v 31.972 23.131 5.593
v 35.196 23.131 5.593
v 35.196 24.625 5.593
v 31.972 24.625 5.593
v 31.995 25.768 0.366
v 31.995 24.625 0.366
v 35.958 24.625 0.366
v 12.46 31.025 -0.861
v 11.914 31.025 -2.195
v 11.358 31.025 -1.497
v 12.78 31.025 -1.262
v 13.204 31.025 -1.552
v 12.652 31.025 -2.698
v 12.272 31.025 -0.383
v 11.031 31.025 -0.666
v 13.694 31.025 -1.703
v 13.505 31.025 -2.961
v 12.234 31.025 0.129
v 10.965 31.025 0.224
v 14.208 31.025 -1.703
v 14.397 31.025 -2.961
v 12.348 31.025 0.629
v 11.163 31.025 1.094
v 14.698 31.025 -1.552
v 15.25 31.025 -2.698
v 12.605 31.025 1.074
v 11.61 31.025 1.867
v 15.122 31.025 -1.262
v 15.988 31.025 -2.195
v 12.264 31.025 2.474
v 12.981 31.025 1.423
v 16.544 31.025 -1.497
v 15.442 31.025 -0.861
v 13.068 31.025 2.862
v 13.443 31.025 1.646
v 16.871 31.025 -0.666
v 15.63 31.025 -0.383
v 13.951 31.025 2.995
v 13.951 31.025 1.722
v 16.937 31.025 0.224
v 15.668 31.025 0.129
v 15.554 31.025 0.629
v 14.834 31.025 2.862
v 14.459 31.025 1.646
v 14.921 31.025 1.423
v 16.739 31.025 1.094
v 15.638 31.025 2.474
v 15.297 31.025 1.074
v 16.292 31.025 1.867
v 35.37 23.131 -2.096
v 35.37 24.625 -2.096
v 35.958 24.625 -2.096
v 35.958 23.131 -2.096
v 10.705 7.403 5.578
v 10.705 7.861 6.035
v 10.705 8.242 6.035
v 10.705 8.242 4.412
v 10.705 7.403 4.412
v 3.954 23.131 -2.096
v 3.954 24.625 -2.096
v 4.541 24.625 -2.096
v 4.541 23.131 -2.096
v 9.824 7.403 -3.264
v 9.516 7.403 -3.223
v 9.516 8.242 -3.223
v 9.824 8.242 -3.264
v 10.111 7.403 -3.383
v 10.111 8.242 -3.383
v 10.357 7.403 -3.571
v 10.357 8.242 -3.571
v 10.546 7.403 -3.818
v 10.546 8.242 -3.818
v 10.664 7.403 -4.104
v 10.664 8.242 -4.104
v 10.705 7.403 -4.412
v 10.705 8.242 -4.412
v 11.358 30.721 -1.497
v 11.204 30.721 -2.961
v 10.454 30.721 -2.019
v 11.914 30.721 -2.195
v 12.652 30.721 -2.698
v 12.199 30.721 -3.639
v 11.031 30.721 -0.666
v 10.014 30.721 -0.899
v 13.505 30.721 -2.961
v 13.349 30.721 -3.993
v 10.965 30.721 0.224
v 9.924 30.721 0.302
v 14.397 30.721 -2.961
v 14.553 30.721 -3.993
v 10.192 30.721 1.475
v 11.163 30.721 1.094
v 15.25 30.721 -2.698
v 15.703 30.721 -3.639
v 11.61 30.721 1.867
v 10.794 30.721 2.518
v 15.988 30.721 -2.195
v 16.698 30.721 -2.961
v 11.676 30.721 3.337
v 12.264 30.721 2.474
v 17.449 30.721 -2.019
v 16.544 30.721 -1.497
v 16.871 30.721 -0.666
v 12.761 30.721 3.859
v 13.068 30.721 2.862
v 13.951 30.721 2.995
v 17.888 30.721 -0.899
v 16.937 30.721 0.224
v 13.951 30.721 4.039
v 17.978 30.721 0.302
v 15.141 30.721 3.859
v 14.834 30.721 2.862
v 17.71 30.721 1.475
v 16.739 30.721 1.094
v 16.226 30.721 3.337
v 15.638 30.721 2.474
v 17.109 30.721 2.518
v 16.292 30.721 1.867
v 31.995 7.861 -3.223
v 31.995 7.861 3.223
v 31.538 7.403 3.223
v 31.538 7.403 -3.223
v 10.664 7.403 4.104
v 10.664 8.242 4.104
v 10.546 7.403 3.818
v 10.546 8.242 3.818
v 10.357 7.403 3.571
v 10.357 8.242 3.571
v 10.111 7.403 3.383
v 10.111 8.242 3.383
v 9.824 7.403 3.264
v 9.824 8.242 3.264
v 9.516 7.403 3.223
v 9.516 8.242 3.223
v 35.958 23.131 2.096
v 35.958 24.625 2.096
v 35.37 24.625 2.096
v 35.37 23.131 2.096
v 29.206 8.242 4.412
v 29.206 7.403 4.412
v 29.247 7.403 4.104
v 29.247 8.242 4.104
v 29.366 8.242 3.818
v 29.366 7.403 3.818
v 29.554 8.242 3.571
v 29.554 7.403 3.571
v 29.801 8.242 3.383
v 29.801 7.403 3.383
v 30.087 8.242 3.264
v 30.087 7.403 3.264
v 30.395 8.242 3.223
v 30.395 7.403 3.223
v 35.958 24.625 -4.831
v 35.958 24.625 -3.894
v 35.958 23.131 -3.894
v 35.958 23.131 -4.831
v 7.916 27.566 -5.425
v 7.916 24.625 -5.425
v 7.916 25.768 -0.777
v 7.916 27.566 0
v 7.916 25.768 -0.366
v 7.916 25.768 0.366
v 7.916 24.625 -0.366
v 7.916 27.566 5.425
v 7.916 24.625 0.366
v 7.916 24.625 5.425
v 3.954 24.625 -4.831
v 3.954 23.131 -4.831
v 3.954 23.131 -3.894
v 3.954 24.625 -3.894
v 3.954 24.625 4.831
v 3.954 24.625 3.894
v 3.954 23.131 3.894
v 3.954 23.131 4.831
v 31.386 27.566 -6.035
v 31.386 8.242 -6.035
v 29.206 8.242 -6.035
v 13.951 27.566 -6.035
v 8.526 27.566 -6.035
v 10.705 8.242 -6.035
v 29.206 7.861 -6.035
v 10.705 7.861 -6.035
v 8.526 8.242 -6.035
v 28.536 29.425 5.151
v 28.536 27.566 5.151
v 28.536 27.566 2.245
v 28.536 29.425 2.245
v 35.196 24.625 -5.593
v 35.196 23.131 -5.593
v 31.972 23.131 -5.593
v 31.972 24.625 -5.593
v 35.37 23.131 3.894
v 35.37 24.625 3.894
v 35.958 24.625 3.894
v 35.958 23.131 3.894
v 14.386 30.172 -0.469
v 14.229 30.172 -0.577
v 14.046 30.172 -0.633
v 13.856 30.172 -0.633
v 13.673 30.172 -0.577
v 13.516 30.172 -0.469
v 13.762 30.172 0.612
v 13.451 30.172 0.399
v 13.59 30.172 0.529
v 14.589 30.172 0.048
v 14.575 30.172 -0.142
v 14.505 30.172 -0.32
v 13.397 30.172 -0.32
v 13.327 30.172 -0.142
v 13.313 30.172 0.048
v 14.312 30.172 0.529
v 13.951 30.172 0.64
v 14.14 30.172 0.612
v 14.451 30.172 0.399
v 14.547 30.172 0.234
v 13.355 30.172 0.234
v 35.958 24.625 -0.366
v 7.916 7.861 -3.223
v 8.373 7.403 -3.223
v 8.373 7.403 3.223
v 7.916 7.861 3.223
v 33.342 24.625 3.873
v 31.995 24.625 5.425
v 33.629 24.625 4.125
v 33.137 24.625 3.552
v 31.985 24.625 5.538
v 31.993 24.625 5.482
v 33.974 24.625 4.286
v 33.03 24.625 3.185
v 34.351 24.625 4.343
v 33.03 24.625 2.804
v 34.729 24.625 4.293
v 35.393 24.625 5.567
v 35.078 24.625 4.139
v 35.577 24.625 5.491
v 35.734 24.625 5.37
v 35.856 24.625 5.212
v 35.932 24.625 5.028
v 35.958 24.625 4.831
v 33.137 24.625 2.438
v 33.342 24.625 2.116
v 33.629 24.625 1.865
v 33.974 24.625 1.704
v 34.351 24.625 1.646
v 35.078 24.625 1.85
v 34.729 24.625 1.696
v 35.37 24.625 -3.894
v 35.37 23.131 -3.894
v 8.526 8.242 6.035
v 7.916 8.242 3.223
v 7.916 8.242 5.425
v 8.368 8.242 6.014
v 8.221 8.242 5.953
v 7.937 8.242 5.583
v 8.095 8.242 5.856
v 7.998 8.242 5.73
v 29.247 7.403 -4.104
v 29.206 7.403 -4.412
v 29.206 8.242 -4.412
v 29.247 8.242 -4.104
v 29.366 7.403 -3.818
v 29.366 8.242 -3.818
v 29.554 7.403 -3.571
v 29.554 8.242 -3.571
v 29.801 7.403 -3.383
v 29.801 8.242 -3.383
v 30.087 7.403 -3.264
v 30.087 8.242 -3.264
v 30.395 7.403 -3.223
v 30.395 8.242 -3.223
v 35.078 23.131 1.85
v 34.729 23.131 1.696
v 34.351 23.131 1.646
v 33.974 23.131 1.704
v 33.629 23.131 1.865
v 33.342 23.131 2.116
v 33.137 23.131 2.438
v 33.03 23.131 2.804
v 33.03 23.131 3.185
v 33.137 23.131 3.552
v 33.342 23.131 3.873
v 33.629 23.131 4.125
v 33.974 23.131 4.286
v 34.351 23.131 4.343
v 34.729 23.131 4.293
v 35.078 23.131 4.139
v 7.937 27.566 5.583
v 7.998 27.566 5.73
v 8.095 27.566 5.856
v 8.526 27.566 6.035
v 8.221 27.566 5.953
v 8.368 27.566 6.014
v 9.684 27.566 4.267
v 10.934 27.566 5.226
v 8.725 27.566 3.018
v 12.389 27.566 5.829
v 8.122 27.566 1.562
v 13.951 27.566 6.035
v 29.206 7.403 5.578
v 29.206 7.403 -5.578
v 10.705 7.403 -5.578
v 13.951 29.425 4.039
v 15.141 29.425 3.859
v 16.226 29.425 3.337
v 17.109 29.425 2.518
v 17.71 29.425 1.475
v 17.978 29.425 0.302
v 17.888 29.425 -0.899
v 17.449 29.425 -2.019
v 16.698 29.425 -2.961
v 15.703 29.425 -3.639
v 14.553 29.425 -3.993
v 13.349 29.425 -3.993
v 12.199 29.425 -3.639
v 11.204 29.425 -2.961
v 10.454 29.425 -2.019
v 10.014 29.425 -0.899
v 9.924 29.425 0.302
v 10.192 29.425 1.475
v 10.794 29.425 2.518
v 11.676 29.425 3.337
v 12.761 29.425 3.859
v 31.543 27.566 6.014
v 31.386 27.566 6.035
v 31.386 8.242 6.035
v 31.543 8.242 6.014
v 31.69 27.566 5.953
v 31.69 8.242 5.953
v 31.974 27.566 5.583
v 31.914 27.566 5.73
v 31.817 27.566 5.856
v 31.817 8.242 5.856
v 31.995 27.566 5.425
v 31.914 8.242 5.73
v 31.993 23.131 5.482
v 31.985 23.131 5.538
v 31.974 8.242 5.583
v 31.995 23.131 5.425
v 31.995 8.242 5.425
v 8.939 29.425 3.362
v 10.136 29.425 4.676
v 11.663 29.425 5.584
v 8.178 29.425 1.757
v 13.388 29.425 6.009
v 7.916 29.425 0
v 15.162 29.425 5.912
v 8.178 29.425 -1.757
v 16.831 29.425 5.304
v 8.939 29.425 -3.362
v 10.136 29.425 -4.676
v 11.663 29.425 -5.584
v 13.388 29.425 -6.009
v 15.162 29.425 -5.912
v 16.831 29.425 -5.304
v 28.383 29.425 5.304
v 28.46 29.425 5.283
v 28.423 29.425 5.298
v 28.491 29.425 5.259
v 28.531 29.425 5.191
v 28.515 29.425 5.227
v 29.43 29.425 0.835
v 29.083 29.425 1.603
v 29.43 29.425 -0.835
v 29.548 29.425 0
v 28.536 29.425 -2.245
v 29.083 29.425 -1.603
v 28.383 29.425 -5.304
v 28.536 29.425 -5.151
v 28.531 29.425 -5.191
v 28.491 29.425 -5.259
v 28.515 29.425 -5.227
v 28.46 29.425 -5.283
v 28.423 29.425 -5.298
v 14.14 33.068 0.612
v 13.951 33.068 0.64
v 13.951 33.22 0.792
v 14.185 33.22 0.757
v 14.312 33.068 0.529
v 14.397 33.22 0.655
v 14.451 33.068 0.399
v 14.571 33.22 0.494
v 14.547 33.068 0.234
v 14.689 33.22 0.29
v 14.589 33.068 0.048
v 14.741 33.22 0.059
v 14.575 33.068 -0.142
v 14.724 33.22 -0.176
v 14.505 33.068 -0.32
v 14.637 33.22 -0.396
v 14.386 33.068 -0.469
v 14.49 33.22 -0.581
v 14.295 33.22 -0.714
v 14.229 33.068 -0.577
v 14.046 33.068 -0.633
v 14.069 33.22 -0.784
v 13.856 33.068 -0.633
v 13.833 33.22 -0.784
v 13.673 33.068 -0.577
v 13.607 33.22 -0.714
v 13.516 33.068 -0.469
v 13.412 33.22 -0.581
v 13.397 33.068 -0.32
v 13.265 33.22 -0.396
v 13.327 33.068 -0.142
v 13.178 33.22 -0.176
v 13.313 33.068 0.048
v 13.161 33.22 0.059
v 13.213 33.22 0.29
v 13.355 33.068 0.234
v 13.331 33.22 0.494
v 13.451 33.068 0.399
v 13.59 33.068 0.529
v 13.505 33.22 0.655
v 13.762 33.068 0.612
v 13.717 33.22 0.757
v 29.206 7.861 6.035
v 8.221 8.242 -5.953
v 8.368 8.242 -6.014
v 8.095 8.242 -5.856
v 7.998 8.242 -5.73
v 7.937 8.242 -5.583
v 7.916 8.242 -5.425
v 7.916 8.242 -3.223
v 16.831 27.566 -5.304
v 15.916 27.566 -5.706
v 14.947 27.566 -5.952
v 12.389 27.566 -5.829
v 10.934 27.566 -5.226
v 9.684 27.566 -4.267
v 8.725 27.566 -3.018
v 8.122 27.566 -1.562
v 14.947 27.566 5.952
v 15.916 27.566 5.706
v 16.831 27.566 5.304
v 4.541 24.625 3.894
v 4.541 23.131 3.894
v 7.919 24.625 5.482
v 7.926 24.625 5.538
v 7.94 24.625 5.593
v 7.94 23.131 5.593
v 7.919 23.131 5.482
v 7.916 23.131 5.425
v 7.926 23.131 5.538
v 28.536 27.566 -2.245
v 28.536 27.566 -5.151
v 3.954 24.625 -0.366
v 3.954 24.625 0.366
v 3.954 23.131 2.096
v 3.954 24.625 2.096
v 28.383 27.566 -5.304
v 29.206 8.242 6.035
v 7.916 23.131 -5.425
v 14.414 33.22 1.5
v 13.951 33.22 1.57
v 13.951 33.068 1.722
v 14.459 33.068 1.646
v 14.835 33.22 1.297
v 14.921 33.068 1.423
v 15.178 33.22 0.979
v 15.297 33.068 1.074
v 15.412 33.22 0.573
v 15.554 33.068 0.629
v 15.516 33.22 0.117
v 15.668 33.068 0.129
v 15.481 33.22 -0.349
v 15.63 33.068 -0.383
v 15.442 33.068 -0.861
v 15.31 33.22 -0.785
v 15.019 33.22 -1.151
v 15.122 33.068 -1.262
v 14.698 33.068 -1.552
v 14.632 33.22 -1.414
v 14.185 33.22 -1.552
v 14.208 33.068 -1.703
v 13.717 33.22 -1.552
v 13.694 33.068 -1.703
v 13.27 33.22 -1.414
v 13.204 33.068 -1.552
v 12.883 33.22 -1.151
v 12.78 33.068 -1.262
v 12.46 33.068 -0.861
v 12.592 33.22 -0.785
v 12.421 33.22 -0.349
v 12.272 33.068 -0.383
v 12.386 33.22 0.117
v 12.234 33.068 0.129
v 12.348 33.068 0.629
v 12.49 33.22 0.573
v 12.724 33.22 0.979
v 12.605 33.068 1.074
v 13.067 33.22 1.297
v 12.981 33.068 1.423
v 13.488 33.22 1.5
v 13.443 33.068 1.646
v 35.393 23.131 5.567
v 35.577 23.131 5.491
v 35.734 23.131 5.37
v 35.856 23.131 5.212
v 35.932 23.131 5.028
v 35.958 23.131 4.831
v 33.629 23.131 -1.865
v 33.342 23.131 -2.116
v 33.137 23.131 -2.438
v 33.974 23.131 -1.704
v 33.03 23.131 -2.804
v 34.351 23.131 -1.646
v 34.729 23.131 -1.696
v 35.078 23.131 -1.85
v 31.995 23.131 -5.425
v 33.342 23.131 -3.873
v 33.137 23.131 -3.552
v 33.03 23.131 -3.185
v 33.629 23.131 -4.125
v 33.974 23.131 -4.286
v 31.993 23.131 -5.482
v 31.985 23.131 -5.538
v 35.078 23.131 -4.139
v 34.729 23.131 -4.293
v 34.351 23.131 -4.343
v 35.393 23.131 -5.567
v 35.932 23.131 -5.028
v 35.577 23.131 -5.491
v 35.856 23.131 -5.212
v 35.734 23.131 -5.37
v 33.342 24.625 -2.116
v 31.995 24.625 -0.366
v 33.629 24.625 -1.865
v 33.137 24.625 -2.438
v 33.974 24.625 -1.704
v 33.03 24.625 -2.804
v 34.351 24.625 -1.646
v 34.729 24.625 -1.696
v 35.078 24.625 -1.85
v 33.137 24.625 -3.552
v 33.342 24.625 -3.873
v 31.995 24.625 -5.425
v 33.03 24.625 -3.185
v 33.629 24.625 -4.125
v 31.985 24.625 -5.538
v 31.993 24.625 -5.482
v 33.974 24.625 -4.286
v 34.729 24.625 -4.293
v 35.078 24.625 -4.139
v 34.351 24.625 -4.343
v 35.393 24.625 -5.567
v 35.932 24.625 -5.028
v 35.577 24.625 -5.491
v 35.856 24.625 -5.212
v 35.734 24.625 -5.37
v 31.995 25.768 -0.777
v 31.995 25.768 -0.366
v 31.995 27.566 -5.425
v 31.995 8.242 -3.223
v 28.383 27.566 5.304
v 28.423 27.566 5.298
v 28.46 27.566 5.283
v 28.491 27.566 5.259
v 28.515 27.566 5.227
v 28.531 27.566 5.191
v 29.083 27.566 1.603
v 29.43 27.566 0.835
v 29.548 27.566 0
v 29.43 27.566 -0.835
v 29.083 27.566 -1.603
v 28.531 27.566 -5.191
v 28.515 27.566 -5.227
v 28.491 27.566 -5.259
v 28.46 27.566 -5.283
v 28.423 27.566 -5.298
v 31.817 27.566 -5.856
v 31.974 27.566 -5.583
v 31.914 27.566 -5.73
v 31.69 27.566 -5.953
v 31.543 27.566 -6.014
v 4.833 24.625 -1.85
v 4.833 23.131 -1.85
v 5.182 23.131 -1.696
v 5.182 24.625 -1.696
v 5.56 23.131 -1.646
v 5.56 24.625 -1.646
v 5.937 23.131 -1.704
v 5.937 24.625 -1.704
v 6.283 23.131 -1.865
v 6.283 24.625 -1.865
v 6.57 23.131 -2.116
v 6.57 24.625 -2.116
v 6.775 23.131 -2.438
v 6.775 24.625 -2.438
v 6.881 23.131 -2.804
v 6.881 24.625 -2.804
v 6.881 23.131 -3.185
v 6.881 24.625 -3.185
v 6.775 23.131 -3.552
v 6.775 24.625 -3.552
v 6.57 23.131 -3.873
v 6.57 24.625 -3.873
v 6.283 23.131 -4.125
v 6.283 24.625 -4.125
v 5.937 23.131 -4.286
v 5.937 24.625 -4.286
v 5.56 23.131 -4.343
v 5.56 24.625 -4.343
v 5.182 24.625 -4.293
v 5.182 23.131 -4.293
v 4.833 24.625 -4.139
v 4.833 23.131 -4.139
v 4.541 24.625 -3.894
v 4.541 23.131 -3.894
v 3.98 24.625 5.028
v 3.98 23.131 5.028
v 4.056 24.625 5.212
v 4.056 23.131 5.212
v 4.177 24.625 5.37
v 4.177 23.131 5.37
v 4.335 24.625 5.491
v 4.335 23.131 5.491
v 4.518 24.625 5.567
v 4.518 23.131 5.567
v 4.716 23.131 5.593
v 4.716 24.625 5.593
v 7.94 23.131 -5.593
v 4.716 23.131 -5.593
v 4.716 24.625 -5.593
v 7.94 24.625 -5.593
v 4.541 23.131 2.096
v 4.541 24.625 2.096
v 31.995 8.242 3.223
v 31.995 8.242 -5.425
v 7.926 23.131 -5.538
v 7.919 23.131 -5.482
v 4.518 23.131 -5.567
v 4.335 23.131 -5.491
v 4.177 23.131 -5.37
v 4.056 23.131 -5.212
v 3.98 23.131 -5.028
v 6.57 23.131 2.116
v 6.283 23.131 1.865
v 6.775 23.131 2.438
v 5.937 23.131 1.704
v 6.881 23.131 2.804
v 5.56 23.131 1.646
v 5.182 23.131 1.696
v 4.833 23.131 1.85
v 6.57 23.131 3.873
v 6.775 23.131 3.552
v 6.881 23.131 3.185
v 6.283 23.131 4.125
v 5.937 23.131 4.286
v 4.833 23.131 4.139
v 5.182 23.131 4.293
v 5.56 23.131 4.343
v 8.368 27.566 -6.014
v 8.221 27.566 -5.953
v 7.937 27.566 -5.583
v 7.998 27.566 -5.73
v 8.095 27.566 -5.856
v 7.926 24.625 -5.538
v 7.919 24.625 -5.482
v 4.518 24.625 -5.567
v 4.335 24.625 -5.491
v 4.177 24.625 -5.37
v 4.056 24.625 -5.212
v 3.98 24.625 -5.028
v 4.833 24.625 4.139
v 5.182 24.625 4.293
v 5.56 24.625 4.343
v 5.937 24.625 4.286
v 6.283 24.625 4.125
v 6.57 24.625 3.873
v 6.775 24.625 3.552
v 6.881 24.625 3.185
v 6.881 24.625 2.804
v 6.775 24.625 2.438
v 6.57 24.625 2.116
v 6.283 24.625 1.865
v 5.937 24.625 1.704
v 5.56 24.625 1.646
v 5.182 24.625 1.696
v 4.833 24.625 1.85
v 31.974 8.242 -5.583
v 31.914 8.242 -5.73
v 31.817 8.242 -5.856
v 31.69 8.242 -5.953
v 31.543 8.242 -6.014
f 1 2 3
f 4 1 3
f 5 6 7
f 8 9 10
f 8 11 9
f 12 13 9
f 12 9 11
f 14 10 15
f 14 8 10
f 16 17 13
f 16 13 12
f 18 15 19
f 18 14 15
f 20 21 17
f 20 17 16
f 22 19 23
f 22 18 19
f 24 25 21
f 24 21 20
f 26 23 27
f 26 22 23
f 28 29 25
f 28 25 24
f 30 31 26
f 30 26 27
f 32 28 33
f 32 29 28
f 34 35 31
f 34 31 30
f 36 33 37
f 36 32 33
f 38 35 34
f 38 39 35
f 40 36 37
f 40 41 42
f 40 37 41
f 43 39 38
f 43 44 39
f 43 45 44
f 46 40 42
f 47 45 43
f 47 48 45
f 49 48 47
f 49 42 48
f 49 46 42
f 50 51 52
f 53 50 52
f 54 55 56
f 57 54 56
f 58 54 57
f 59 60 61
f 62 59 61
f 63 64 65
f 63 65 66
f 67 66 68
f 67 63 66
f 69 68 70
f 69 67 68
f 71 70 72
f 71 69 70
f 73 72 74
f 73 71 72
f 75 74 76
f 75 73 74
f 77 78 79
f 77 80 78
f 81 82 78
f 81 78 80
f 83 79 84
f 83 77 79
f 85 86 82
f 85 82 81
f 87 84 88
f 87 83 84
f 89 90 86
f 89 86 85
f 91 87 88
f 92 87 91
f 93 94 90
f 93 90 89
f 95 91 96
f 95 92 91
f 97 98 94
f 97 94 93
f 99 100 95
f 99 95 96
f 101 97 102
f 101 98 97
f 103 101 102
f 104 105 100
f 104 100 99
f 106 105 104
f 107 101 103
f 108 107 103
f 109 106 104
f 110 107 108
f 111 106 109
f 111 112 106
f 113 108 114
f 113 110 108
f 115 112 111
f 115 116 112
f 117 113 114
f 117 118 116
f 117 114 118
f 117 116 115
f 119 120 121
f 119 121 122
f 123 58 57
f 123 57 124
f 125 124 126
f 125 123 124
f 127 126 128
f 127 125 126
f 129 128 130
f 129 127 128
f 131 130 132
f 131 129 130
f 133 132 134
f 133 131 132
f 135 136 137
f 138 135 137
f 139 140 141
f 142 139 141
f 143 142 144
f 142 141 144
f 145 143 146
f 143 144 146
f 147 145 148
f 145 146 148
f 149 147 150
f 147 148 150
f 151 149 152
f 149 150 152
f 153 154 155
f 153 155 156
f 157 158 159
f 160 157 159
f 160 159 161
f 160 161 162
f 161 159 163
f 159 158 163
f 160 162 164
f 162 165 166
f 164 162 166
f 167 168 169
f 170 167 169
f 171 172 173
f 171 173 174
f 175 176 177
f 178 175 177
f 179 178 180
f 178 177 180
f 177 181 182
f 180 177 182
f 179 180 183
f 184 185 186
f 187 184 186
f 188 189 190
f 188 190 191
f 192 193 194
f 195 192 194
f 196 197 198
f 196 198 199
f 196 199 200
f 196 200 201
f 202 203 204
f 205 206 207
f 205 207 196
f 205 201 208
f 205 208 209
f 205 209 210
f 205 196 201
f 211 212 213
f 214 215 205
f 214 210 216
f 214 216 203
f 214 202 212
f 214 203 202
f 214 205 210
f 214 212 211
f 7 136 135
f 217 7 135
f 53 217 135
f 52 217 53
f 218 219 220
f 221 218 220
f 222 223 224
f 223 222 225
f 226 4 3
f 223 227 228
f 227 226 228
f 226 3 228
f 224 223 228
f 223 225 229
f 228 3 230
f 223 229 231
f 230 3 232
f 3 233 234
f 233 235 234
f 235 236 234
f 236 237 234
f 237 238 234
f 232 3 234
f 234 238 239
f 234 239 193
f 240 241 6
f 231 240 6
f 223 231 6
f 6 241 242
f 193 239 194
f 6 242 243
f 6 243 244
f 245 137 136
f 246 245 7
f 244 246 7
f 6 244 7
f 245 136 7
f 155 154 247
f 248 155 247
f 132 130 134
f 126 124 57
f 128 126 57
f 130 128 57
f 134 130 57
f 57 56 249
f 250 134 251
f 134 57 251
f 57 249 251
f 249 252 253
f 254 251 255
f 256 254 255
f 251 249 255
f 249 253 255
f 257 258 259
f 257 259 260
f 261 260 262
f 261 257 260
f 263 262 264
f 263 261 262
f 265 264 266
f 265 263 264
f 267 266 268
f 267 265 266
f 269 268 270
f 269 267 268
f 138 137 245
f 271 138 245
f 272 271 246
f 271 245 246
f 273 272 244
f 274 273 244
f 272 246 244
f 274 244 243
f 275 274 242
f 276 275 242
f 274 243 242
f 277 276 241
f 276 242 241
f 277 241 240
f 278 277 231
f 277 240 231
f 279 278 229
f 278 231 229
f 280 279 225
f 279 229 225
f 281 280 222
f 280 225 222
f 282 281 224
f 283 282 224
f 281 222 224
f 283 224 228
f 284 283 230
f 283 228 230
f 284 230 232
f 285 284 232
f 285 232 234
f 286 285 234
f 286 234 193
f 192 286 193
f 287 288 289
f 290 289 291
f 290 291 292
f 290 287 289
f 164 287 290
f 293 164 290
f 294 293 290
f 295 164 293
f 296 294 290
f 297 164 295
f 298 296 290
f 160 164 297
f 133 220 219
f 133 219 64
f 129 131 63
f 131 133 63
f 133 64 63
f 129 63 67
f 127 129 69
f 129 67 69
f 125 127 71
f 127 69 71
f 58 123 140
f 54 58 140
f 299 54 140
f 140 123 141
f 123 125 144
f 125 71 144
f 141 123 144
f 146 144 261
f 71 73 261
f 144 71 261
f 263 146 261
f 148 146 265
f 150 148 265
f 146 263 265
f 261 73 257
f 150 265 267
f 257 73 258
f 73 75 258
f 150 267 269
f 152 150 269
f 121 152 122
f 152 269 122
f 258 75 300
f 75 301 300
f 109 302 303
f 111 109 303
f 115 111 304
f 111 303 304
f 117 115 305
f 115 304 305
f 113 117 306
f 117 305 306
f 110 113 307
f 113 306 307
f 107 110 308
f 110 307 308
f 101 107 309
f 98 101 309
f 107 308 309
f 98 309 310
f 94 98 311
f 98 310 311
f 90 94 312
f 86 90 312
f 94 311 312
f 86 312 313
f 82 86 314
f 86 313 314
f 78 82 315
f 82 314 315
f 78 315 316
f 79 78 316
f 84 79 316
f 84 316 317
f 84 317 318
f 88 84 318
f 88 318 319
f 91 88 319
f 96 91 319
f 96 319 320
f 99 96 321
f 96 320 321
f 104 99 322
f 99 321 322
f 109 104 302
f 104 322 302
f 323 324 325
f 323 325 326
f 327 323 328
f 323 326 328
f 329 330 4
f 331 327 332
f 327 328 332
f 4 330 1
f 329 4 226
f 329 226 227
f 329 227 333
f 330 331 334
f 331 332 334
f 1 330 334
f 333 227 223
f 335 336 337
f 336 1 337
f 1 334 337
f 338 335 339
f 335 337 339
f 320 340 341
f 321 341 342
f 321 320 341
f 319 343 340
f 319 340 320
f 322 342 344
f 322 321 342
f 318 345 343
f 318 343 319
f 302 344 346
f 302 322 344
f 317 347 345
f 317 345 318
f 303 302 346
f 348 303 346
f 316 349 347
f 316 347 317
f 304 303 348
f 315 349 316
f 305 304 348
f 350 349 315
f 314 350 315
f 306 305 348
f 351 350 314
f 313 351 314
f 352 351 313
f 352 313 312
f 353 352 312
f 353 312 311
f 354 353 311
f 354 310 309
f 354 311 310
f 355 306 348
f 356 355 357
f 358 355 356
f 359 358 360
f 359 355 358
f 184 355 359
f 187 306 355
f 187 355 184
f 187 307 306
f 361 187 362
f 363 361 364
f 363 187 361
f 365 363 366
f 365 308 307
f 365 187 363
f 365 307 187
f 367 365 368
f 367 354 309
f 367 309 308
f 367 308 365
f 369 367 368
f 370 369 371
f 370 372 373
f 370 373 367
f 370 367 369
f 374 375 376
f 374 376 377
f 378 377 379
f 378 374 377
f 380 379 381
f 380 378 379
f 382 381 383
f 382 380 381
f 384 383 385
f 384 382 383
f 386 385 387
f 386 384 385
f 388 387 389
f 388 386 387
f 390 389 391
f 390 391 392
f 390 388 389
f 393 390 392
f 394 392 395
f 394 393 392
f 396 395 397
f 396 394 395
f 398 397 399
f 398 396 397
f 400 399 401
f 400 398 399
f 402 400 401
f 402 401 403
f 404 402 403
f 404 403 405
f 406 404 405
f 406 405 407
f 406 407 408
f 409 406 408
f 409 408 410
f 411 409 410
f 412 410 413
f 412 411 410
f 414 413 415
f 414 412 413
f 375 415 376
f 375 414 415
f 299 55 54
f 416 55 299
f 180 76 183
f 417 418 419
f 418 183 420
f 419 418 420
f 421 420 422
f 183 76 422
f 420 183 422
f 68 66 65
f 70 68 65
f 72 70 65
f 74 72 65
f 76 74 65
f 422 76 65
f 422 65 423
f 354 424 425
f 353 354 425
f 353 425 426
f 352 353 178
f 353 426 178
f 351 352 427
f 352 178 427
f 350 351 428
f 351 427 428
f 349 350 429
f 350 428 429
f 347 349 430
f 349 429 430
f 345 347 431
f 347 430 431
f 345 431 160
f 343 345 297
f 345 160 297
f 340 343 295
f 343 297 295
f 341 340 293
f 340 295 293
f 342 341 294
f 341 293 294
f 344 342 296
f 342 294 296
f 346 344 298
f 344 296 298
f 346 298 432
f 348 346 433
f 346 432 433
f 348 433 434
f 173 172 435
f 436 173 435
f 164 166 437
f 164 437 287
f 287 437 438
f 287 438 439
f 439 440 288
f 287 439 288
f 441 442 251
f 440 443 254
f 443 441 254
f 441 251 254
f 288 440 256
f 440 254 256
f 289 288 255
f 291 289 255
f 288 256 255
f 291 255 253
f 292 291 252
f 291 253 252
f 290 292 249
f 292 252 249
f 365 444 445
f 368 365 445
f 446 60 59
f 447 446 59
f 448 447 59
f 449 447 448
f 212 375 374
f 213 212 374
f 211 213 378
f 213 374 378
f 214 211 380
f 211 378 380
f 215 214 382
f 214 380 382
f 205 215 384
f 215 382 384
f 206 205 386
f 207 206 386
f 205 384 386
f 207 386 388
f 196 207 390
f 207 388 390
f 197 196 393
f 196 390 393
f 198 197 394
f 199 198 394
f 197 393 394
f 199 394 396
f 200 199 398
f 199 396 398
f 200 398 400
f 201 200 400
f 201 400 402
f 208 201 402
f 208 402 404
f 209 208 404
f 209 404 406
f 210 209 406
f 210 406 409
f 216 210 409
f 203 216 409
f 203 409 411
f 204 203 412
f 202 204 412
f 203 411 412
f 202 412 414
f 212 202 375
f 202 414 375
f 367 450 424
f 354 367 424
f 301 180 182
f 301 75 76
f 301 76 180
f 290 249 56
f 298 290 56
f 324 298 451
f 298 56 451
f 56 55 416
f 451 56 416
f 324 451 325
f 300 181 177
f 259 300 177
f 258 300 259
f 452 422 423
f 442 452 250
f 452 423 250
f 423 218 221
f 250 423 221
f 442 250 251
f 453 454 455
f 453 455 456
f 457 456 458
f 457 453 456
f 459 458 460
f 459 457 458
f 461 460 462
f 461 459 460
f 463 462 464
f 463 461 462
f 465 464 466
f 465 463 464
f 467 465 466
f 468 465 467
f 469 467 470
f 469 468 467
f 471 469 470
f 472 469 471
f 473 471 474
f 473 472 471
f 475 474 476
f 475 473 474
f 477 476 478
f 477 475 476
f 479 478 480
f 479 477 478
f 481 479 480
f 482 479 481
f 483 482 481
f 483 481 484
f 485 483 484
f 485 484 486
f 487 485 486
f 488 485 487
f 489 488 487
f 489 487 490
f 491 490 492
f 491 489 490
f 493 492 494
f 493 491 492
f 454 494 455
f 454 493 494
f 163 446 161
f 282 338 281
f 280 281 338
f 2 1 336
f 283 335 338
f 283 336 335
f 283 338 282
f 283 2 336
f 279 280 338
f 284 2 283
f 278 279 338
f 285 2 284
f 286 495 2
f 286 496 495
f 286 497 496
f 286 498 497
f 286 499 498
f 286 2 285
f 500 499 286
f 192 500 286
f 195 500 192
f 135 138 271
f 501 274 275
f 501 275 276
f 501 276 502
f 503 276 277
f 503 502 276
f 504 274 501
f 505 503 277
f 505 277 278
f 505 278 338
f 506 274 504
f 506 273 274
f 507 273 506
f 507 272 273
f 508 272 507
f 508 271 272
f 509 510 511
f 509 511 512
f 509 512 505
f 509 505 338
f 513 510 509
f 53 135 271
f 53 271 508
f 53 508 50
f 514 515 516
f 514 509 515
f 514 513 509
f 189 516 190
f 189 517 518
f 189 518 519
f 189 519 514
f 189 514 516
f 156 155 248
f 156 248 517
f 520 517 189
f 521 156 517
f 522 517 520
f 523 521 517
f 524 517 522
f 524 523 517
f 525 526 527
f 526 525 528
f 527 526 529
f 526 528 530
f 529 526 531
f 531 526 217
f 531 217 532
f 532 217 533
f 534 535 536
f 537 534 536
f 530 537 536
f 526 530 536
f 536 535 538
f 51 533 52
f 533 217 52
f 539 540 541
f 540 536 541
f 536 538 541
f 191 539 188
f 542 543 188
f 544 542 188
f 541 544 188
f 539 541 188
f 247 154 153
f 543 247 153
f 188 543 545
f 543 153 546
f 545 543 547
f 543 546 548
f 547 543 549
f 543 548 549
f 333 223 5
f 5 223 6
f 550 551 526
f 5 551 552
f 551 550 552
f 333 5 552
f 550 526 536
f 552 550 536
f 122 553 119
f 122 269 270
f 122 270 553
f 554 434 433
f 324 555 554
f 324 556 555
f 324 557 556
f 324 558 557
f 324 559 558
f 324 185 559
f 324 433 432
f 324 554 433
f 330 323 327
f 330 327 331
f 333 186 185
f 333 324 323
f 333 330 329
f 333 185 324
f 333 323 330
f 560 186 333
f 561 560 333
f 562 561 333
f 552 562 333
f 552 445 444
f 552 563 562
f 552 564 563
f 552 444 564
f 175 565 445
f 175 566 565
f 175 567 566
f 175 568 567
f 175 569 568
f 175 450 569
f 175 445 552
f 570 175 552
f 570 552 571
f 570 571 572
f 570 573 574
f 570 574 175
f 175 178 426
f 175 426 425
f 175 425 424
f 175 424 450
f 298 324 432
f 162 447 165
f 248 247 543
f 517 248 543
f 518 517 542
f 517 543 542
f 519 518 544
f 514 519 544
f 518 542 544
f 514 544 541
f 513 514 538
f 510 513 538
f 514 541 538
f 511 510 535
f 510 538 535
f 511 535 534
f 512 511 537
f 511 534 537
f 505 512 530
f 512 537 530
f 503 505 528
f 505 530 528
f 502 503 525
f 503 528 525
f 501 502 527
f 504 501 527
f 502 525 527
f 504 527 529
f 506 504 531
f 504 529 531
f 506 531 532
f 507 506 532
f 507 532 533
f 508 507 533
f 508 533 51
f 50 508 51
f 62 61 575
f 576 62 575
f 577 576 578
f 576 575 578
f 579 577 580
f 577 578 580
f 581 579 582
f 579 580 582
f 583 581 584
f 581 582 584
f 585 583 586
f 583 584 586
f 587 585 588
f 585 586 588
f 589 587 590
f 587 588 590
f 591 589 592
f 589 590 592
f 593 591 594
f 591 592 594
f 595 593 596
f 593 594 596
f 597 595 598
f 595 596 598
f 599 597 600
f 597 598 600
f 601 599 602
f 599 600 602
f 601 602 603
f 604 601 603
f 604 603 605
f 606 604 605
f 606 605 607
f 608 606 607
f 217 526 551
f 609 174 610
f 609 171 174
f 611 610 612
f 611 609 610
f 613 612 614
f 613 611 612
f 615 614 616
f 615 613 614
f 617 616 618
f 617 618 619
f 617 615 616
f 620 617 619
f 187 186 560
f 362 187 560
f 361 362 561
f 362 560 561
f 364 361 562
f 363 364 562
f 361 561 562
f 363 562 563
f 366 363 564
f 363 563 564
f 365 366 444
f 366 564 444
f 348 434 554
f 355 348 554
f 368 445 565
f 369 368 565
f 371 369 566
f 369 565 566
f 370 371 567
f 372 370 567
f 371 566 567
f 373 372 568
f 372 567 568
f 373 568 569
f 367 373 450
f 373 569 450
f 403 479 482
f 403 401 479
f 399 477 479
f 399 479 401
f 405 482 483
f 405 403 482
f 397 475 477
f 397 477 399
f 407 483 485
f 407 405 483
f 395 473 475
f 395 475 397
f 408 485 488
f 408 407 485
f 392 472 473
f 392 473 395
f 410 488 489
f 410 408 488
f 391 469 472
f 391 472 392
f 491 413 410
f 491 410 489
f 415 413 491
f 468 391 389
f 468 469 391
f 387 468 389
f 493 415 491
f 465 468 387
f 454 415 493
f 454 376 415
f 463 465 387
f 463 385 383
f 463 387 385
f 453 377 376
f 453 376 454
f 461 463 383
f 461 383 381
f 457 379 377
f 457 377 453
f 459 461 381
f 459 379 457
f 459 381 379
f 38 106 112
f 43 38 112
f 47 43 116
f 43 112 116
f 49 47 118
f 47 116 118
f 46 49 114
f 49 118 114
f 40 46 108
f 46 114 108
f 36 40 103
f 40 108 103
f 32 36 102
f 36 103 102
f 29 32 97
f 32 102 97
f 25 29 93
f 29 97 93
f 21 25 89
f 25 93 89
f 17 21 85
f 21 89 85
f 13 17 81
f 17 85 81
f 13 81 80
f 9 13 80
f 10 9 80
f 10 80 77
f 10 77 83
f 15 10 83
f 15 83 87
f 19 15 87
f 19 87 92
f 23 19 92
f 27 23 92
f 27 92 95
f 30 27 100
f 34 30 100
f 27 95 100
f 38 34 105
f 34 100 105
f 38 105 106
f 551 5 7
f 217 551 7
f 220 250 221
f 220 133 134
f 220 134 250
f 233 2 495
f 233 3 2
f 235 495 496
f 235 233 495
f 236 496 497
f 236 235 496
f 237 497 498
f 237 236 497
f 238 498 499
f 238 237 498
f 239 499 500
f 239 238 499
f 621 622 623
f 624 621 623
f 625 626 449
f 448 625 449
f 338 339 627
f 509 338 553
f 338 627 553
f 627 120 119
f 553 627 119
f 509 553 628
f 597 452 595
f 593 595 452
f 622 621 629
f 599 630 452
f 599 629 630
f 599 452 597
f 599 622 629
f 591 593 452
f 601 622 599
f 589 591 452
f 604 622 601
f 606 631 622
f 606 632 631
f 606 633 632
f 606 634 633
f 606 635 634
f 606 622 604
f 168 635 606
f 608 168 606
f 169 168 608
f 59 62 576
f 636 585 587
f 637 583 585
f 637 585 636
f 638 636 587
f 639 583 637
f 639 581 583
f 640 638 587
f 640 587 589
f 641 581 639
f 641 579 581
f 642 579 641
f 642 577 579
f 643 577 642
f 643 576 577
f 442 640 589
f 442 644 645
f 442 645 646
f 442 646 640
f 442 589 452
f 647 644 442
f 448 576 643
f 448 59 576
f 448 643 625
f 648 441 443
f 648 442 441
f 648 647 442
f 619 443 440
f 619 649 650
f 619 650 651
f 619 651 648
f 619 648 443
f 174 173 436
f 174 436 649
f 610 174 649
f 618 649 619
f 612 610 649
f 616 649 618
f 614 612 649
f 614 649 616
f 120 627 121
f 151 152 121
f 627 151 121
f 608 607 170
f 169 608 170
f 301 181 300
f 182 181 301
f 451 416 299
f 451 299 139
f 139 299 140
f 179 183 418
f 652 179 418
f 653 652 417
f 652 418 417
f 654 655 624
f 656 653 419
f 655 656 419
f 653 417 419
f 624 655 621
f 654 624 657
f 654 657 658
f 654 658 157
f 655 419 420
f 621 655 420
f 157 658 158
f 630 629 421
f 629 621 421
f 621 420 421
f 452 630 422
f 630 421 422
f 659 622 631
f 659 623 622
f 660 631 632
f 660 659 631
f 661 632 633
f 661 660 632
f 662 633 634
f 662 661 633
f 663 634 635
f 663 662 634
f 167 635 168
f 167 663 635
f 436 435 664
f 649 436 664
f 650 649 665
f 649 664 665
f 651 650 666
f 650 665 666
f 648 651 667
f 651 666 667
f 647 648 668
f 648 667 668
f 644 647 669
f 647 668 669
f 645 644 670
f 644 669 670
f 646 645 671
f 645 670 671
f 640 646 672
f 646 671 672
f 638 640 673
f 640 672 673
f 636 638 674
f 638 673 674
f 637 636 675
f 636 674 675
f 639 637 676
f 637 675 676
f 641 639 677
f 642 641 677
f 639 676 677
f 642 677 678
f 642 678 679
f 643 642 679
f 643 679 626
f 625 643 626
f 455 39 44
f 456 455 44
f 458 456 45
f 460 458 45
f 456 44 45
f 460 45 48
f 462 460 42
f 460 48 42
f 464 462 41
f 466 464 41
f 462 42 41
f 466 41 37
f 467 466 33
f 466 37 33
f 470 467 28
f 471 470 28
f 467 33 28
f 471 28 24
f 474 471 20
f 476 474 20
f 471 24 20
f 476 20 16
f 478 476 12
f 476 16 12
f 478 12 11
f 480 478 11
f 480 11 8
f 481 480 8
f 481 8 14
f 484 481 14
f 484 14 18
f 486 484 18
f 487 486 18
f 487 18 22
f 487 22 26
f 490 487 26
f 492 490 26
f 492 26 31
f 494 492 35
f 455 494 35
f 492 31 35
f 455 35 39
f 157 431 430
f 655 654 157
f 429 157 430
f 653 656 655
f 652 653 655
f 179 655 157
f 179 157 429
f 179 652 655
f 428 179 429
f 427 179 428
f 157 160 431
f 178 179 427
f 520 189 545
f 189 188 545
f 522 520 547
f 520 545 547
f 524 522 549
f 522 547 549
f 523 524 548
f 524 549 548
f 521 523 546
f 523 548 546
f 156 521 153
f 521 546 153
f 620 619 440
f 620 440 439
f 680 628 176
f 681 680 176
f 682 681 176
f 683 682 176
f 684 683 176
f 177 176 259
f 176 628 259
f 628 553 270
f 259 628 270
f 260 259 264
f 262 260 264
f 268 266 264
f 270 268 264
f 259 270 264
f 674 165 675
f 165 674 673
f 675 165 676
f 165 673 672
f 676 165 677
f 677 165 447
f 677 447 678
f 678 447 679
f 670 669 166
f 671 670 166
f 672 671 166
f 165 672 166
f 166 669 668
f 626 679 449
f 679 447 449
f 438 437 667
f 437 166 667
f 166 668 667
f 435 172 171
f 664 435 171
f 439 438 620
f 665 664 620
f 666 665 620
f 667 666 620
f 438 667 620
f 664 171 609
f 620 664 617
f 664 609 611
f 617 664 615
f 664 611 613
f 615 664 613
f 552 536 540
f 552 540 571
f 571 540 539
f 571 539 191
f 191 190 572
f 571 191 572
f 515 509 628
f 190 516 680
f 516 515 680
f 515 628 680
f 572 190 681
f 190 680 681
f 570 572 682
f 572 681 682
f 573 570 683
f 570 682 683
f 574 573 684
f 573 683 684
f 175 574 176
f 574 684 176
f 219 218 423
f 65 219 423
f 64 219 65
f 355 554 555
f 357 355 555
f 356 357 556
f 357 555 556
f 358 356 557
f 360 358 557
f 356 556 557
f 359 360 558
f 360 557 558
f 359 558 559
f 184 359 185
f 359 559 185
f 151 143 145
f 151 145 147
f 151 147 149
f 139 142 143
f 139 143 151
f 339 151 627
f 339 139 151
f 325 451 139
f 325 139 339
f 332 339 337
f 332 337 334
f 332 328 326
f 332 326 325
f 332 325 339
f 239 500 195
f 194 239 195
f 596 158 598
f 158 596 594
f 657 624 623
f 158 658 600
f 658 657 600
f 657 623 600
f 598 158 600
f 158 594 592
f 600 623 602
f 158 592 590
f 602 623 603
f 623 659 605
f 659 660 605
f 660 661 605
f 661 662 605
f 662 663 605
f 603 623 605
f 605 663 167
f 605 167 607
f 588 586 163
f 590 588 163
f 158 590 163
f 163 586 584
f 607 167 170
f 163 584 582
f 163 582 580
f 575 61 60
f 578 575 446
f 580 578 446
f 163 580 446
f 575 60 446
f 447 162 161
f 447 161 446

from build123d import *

# Parameters (mm, degrees)
BOSS_EXTRUDE1_DEPTH = 33.6042
CUT_EXTRUDE1_DEPTH  = 1.397
CHAMFER1_SIZE       = 0.762
SKETCH3_W           = 18.6436
SKETCH3_H           = 2.4892
BOSS_EXTRUDE2_DEPTH = 6.604
SKETCH4_W           = 18.6436
SKETCH4_H           = 2.4892
BOSS_EXTRUDE3_DEPTH = 6.604
FILLET1_R           = 1.27
CUT_EXTRUDE2_DEPTH  = 3.048
SKETCH6_W           = 6.604
SKETCH6_H           = 1.2192
BOSS_EXTRUDE4_DEPTH = 1.905
CUT_EXTRUDE3_DEPTH  = 1.905
BOSS_EXTRUDE5_DEPTH = 3.0988
SKETCH9_R           = 6.731
BOSS_EXTRUDE6_DEPTH = 2.159
SKETCH10_R          = 4.9911
BOSS_EXTRUDE7_DEPTH = 0.508
SKETCH11_R          = 2.8702
BOSS_EXTRUDE8_DEPTH = 3.6576
SKETCH12_R          = 1.0668
CUT_EXTRUDE4_DEPTH  = 5.08
CHAMFER2_SIZE       = 0.254
SCALE1_SCALE        = 0.6


with BuildPart() as part:
    # Sketch1 → Boss-Extrude1 (new body)
    with BuildSketch(Plane(origin=(0, 0, 0), x_dir=(1, 0, 0), z_dir=(0, 1, 0))):
        with BuildLine():
            Line((0, 9.0424), (0, -9.0424))
            ThreePointArc((0, -9.0424), (0.29757951, -9.76082049), (1.016, -10.0584))
            Line((1.016, -10.0584), (39.116, -10.0584))
            ThreePointArc((39.116, -10.0584), (39.83442049, -9.76082049), (40.132, -9.0424))
            Line((40.132, -9.0424), (40.132, 9.0424))
            ThreePointArc((40.132, 9.0424), (39.83442049, 9.76082049), (39.116, 10.0584))
            Line((39.116, 10.0584), (1.016, 10.0584))
            ThreePointArc((1.016, 10.0584), (0.29757951, 9.76082049), (0, 9.0424))
        make_face()
    extrude(amount=BOSS_EXTRUDE1_DEPTH)

    # Sketch2 → Cut-Extrude1 (cut)
    with BuildSketch(Plane.XZ):
        with BuildLine():
            Line((4.6482, 10.0584), (4.6482, 7.3533))
            ThreePointArc((4.6482, 7.3533), (4.067919955, 5.952380045), (2.667, 5.3721))
            Line((2.667, 5.3721), (0, 5.3721))
            Line((0, 5.3721), (0, 9.0424))
            ThreePointArc((0, 9.0424), (0.29757951, 9.76082049), (1.016, 10.0584))
            Line((1.016, 10.0584), (4.6482, 10.0584))
        make_face()
        with BuildLine():
            Line((35.4838, 10.0584), (35.4838, 7.3533))
            ThreePointArc((35.4838, 7.3533), (36.064080045, 5.952380045), (37.465, 5.3721))
            Line((37.465, 5.3721), (40.132, 5.3721))
            Line((40.132, 5.3721), (40.132, 9.0424))
            ThreePointArc((40.132, 9.0424), (39.83442049, 9.76082049), (39.116, 10.0584))
            Line((39.116, 10.0584), (35.4838, 10.0584))
        make_face()
        with BuildLine():
            Line((0, -5.3721), (2.667, -5.3721))
            ThreePointArc((2.667, -5.3721), (4.067919955, -5.952380045), (4.6482, -7.3533))
            Line((4.6482, -7.3533), (4.6482, -10.0584))
            Line((4.6482, -10.0584), (1.016, -10.0584))
            ThreePointArc((1.016, -10.0584), (0.29757951, -9.76082049), (0, -9.0424))
            Line((0, -9.0424), (0, -5.3721))
        make_face()
        with BuildLine():
            Line((37.465, -5.3721), (40.132, -5.3721))
            Line((40.132, -5.3721), (40.132, -9.0424))
            ThreePointArc((40.132, -9.0424), (39.83442049, -9.76082049), (39.116, -10.0584))
            Line((39.116, -10.0584), (35.4838, -10.0584))
            Line((35.4838, -10.0584), (35.4838, -7.3533))
            ThreePointArc((35.4838, -7.3533), (36.064080045, -5.952380045), (37.465, -5.3721))
        make_face()
    extrude(amount=-CUT_EXTRUDE1_DEPTH, mode=Mode.SUBTRACT)

    # Chamfer1
    chamfer1_edges = [part.edges().sort_by_distance(p)[0] for p in [
        (20.066, 0, 10.0584),
        (0, 0, 0),
        (40.132, 0, 0),
        (20.066, 0, -10.0584),
    ]]
    chamfer(chamfer1_edges, length=CHAMFER1_SIZE)

    # Sketch3 → Boss-Extrude2 (add, symmetric)
    with BuildSketch(Plane(origin=(40.132, 0, 0), x_dir=(0, 0, -1), z_dir=(1, 0, 0))):
        with Locations((0, 27.4574)):
            Rectangle(SKETCH3_W, SKETCH3_H)
    extrude(amount=BOSS_EXTRUDE2_DEPTH, both=True)

    # Sketch4 → Boss-Extrude3 (add, symmetric)
    with BuildSketch(Plane.ZY):
        with Locations((0, 27.4574)):
            Rectangle(SKETCH4_W, SKETCH4_H)
    extrude(amount=BOSS_EXTRUDE3_DEPTH, both=True)

    # Fillet1
    fillet1_edges = [part.edges().sort_by_distance(p)[0] for p in [
        (46.736, 27.4574, 9.3218),
        (46.736, 27.4574, -9.3218),
        (-6.604, 27.4574, -9.3218),
        (-6.604, 27.4574, 9.3218),
    ]]
    fillet(fillet1_edges, radius=FILLET1_R)

    # Sketch5 → Cut-Extrude2 (cut)
    with BuildSketch(Plane(origin=(0, 28.702, 0), x_dir=(1, 0, 0), z_dir=(0, 1, 0))):
        with BuildLine():
            Line((-6.604, 3.4925), (-5.625185736, 3.4925))
            ThreePointArc((-5.625185736, 3.4925), (-1.7018, 4.9911), (-5.625185736, 6.4897))
            Line((-5.625185736, 6.4897), (-6.604, 6.4897))
            Line((-6.604, 6.4897), (-6.604, 3.4925))
        make_face()
        with BuildLine():
            Line((-6.604, -6.4897), (-5.625185736, -6.4897))
            ThreePointArc((-5.625185736, -6.4897), (-1.7018, -4.9911), (-5.625185736, -3.4925))
            Line((-5.625185736, -3.4925), (-6.604, -3.4925))
            Line((-6.604, -3.4925), (-6.604, -6.4897))
        make_face()
        with BuildLine():
            Line((45.757185736, -6.4897), (46.736, -6.4897))
            Line((46.736, -6.4897), (46.736, -3.4925))
            Line((46.736, -3.4925), (45.757185736, -3.4925))
            ThreePointArc((45.757185736, -3.4925), (41.8338, -4.9911), (45.757185736, -6.4897))
        make_face()
        with BuildLine():
            Line((45.757185736, 3.4925), (46.736, 3.4925))
            Line((46.736, 3.4925), (46.736, 6.4897))
            Line((46.736, 6.4897), (45.757185736, 6.4897))
            ThreePointArc((45.757185736, 6.4897), (41.8338, 4.9911), (45.757185736, 3.4925))
        make_face()
    extrude(amount=-CUT_EXTRUDE2_DEPTH, mode=Mode.SUBTRACT)

    # Sketch6 → Boss-Extrude4 (add)
    with BuildSketch(Plane(origin=(0, 28.702, 0), x_dir=(1, 0, 0), z_dir=(0, 1, 0))):
        with Locations((-3.302, 0)):
            Rectangle(SKETCH6_W, SKETCH6_H)
        with Locations((43.434, 0)):
            Rectangle(SKETCH6_W, SKETCH6_H)
    extrude(amount=BOSS_EXTRUDE4_DEPTH)

    # Sketch7 → Cut-Extrude3 (cut)
    with BuildSketch(Plane.XY.offset(0.6096)):
        Polygon((40.132, 30.607), (46.736, 28.702), (46.736, 30.607), align=None)
        Polygon((0, 30.607), (-6.604, 28.702), (-6.604, 30.607), align=None)
    extrude(amount=-CUT_EXTRUDE3_DEPTH, mode=Mode.SUBTRACT)

    # Sketch8 → Boss-Extrude5 (add)
    with BuildSketch(Plane(origin=(0, 33.6042, 0), x_dir=(1, 0, 0), z_dir=(0, 1, 0))):
        with BuildLine():
            Line((14.8583952, -8.8392), (34.1122, -8.8392))
            ThreePointArc((34.1122, -8.8392), (34.291805122, -8.764805122), (34.3662, -8.5852))
            Line((34.3662, -8.5852), (34.3662, -3.741254719))
            ThreePointArc((34.3662, -3.741254719), (36.053651663, 0), (34.3662, 3.741254719))
            Line((34.3662, 3.741254719), (34.3662, 8.5852))
            ThreePointArc((34.3662, 8.5852), (34.291805122, 8.764805122), (34.1122, 8.8392))
            Line((34.1122, 8.8392), (14.8583952, 8.8392))
            ThreePointArc((14.8583952, 8.8392), (0, 0), (14.8583952, -8.8392))
        make_face()
    extrude(amount=BOSS_EXTRUDE5_DEPTH)

    # Sketch9 → Boss-Extrude6 (add)
    with BuildSketch(Plane(origin=(0, 36.703, 0), x_dir=(1, 0, 0), z_dir=(0, 1, 0))):
        with Locations(Location((10.0584, 0, 0), (0, 0, 270))):
            Circle(SKETCH9_R)
    extrude(amount=BOSS_EXTRUDE6_DEPTH)

    # Sketch10 → Boss-Extrude7 (add)
    with BuildSketch(Plane(origin=(0, 38.862, 0), x_dir=(1, 0, 0), z_dir=(0, 1, 0))):
        with Locations(Location((10.0584, 0, 0), (0, 0, 270))):
            Circle(SKETCH10_R)
    extrude(amount=BOSS_EXTRUDE7_DEPTH)

    # Sketch11 → Boss-Extrude8 (add)
    with BuildSketch(Plane(origin=(0, 39.37, 0), x_dir=(1, 0, 0), z_dir=(0, 1, 0))):
        with Locations(Location((10.0584, 0, 0), (0, 0, 270))):
            Circle(SKETCH11_R)
    extrude(amount=BOSS_EXTRUDE8_DEPTH)

    # Sketch12 → Cut-Extrude4 (cut)
    with BuildSketch(Plane(origin=(0, 43.0276, 0), x_dir=(1, 0, 0), z_dir=(0, 1, 0))):
        with Locations(Location((10.0584, 0, 0), (0, 0, 270))):
            Circle(SKETCH12_R)
    extrude(amount=-CUT_EXTRUDE4_DEPTH, mode=Mode.SUBTRACT)

    # Chamfer2
    chamfer2_edges = [part.edges().sort_by_distance(p)[0] for p in [
        (10.0584, 43.0276, -2.8702),
        (10.0584, 43.0276, -1.0668),
    ]]
    chamfer(chamfer2_edges, length=CHAMFER2_SIZE)


with BuildPart() as part_1:
    # Scale1: scaled about (19.790017038, 18.508512474, 0)
    add(part.part.scale(SCALE1_SCALE).moved(Location((7.916006815, 7.40340499, 0))))


solid = part_1.part
